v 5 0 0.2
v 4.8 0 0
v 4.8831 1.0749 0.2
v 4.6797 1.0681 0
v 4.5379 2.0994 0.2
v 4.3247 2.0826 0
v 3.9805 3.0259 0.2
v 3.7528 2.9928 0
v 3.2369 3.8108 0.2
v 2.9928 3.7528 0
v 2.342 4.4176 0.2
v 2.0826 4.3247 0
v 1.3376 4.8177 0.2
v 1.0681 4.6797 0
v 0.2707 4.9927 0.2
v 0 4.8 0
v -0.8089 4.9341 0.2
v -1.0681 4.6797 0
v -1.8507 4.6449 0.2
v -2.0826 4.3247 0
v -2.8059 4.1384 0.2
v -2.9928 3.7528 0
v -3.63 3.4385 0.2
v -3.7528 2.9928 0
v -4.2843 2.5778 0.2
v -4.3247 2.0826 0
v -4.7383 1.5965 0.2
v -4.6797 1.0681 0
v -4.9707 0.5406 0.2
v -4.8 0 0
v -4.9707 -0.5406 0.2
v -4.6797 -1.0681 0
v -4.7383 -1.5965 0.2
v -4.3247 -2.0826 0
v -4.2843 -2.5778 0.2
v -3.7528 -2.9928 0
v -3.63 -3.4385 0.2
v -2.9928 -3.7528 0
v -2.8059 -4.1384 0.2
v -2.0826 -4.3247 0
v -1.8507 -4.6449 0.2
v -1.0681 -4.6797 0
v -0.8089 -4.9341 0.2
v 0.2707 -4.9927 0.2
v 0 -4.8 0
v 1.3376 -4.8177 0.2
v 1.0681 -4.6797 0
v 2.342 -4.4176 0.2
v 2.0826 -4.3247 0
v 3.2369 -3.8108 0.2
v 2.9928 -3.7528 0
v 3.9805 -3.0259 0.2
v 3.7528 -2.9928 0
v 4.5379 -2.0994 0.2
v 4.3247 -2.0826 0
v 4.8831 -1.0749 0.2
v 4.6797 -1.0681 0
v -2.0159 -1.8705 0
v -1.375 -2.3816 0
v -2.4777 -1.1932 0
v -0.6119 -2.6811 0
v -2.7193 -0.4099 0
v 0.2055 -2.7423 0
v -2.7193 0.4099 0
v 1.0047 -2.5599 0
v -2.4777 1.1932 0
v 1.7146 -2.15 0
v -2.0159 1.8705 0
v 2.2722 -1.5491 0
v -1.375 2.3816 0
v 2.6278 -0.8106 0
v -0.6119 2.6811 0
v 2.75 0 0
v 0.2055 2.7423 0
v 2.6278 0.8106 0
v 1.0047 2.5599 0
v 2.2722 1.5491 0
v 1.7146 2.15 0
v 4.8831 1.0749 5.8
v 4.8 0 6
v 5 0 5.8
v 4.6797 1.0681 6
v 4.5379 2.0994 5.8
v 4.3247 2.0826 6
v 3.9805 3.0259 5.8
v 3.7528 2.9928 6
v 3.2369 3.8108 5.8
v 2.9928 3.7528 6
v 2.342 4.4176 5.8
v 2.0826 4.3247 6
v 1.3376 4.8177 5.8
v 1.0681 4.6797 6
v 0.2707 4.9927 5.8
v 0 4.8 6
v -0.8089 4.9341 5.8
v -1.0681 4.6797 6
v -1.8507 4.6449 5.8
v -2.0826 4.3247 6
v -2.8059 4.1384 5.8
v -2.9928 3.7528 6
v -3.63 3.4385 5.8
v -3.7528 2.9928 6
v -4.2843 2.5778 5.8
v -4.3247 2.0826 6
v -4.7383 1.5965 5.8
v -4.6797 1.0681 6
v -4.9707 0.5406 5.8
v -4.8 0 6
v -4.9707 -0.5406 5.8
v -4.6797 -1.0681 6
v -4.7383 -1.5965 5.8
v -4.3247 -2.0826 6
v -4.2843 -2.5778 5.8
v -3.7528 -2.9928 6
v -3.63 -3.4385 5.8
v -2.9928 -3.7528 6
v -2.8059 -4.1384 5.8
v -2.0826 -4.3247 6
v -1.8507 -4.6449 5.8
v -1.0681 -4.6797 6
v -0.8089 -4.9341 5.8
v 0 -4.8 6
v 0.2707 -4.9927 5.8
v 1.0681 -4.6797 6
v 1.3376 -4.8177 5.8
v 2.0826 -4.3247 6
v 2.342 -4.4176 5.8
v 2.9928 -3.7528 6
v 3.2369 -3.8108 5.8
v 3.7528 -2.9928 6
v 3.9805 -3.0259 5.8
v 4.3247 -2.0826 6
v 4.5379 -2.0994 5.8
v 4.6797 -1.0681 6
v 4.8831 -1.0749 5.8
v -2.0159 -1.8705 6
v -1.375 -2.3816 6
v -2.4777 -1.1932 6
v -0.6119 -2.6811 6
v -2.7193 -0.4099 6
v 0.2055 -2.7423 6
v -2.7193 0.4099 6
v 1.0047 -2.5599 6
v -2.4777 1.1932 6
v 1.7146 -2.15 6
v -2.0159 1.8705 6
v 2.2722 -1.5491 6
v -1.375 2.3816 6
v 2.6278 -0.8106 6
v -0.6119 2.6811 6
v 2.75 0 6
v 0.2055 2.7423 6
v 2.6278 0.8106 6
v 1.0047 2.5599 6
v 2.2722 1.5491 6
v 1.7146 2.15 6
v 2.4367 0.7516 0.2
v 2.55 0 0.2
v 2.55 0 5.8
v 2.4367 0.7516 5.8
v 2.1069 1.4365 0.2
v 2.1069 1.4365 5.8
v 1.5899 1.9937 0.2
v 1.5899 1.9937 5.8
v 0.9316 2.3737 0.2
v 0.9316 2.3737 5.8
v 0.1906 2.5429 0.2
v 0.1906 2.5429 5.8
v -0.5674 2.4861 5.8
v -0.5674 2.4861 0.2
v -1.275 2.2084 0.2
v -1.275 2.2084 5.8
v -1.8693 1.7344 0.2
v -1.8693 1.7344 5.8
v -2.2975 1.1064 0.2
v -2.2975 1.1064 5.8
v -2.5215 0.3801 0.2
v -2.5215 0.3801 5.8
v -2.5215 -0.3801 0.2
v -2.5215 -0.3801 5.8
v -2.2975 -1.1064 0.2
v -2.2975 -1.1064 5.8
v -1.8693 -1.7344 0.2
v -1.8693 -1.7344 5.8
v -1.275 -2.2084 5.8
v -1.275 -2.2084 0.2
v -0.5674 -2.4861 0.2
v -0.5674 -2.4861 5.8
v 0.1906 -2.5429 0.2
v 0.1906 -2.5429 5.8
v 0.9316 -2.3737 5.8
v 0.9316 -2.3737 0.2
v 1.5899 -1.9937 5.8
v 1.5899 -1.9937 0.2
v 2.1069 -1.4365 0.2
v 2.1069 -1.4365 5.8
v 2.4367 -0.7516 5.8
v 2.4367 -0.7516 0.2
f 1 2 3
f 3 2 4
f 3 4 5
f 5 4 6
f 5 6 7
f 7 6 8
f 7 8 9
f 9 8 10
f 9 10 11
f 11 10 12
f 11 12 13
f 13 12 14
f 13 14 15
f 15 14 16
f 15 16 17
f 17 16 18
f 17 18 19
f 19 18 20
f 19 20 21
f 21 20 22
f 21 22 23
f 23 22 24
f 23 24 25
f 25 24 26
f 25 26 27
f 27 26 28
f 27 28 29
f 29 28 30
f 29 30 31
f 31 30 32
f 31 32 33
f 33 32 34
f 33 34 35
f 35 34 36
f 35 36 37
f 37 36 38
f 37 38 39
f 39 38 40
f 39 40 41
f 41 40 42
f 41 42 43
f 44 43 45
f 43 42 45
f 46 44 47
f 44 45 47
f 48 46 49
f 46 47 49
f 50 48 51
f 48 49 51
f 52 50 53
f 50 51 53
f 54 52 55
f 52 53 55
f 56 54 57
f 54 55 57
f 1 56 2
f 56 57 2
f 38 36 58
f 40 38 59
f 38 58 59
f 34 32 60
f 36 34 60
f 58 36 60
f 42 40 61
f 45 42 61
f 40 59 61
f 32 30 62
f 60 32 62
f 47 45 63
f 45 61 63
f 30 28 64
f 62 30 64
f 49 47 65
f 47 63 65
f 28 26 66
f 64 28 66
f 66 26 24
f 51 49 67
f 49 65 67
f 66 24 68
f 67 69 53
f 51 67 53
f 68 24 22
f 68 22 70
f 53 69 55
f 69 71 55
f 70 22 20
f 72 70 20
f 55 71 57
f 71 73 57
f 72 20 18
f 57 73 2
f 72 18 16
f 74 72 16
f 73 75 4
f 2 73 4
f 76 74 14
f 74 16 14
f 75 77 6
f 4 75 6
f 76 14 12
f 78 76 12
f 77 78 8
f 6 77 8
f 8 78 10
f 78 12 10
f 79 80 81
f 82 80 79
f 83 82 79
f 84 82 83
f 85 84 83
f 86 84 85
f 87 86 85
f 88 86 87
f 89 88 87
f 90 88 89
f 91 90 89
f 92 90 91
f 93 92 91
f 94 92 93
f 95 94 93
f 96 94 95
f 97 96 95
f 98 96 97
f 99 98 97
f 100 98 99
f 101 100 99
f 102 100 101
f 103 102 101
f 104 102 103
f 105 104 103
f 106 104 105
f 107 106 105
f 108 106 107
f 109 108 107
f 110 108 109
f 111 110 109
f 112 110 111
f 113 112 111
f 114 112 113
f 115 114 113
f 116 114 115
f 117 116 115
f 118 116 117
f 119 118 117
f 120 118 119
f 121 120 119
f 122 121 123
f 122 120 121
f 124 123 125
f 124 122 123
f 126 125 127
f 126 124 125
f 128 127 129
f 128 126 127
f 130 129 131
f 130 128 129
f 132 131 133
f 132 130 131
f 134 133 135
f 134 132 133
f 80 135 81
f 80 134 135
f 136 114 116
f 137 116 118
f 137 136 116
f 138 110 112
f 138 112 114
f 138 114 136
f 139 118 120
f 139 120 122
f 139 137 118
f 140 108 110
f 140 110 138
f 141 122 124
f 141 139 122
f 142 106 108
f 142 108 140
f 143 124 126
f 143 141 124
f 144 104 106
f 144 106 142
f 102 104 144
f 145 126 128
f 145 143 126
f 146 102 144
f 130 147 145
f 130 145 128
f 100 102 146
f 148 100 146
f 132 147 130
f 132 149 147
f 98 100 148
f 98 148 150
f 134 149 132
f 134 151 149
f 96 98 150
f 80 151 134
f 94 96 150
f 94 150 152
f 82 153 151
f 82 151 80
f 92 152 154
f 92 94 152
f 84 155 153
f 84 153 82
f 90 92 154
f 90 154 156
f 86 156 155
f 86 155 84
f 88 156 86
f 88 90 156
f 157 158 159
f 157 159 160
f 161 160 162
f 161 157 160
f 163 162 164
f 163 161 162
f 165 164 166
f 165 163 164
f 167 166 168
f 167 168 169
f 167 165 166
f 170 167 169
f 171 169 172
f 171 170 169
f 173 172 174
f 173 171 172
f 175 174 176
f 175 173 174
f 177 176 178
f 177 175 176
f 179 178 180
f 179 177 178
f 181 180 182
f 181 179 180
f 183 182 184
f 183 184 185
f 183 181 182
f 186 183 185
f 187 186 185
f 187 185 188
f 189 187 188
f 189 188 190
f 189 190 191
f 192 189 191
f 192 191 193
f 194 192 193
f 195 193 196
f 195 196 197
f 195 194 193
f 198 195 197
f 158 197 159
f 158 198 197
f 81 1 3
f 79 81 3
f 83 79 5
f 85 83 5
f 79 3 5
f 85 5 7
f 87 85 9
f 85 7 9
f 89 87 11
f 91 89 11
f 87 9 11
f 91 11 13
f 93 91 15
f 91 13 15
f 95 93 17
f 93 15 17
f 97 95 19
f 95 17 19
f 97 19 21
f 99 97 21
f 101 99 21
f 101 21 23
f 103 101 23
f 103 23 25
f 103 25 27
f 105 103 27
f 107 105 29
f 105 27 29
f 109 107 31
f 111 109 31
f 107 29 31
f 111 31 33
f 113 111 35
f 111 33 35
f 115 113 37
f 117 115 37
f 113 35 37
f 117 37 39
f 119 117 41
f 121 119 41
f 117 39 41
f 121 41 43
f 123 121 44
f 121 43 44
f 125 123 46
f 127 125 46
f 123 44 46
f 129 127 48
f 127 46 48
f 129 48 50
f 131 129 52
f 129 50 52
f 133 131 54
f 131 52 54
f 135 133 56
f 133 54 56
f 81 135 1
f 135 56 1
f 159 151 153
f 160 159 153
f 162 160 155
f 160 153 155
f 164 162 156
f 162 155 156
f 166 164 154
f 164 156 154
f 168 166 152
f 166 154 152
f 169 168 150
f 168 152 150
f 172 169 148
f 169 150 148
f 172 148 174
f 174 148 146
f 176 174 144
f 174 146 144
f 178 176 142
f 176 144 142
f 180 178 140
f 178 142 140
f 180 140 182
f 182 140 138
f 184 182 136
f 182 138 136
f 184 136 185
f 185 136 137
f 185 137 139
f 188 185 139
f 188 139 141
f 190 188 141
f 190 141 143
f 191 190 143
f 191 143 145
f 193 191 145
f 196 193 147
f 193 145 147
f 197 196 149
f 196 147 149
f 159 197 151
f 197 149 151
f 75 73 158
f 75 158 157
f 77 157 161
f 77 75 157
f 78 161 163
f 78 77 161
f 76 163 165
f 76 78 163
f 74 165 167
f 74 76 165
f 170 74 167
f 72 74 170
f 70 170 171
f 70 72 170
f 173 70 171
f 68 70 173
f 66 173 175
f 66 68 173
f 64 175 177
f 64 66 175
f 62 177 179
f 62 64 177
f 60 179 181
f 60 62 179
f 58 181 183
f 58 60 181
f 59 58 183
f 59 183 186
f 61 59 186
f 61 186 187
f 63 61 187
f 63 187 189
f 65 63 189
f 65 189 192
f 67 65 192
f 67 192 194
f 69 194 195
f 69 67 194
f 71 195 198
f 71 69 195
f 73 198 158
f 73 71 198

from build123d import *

# Parameters (mm, degrees)
SKETCH1_R           = 5
SKETCH1_R_2         = 2.55
BOSS_EXTRUDE1_DEPTH = 6
CHAMFER1_SIZE       = 0.2


with BuildPart() as part:
    # Sketch1 → Boss-Extrude1 (new body)
    with BuildSketch(Plane.XY):
        Circle(SKETCH1_R)
        Circle(SKETCH1_R_2, mode=Mode.SUBTRACT)
    extrude(amount=BOSS_EXTRUDE1_DEPTH)

    # Chamfer1
    chamfer1_edges = [part.edges().sort_by_distance(p)[0] for p in [
        (-5, 0, 0),
        (-5, 0, 6),
        (-2.55, 0, 0),
        (-2.55, 0, 6),
    ]]
    chamfer(chamfer1_edges, length=CHAMFER1_SIZE)


solid = part.part
